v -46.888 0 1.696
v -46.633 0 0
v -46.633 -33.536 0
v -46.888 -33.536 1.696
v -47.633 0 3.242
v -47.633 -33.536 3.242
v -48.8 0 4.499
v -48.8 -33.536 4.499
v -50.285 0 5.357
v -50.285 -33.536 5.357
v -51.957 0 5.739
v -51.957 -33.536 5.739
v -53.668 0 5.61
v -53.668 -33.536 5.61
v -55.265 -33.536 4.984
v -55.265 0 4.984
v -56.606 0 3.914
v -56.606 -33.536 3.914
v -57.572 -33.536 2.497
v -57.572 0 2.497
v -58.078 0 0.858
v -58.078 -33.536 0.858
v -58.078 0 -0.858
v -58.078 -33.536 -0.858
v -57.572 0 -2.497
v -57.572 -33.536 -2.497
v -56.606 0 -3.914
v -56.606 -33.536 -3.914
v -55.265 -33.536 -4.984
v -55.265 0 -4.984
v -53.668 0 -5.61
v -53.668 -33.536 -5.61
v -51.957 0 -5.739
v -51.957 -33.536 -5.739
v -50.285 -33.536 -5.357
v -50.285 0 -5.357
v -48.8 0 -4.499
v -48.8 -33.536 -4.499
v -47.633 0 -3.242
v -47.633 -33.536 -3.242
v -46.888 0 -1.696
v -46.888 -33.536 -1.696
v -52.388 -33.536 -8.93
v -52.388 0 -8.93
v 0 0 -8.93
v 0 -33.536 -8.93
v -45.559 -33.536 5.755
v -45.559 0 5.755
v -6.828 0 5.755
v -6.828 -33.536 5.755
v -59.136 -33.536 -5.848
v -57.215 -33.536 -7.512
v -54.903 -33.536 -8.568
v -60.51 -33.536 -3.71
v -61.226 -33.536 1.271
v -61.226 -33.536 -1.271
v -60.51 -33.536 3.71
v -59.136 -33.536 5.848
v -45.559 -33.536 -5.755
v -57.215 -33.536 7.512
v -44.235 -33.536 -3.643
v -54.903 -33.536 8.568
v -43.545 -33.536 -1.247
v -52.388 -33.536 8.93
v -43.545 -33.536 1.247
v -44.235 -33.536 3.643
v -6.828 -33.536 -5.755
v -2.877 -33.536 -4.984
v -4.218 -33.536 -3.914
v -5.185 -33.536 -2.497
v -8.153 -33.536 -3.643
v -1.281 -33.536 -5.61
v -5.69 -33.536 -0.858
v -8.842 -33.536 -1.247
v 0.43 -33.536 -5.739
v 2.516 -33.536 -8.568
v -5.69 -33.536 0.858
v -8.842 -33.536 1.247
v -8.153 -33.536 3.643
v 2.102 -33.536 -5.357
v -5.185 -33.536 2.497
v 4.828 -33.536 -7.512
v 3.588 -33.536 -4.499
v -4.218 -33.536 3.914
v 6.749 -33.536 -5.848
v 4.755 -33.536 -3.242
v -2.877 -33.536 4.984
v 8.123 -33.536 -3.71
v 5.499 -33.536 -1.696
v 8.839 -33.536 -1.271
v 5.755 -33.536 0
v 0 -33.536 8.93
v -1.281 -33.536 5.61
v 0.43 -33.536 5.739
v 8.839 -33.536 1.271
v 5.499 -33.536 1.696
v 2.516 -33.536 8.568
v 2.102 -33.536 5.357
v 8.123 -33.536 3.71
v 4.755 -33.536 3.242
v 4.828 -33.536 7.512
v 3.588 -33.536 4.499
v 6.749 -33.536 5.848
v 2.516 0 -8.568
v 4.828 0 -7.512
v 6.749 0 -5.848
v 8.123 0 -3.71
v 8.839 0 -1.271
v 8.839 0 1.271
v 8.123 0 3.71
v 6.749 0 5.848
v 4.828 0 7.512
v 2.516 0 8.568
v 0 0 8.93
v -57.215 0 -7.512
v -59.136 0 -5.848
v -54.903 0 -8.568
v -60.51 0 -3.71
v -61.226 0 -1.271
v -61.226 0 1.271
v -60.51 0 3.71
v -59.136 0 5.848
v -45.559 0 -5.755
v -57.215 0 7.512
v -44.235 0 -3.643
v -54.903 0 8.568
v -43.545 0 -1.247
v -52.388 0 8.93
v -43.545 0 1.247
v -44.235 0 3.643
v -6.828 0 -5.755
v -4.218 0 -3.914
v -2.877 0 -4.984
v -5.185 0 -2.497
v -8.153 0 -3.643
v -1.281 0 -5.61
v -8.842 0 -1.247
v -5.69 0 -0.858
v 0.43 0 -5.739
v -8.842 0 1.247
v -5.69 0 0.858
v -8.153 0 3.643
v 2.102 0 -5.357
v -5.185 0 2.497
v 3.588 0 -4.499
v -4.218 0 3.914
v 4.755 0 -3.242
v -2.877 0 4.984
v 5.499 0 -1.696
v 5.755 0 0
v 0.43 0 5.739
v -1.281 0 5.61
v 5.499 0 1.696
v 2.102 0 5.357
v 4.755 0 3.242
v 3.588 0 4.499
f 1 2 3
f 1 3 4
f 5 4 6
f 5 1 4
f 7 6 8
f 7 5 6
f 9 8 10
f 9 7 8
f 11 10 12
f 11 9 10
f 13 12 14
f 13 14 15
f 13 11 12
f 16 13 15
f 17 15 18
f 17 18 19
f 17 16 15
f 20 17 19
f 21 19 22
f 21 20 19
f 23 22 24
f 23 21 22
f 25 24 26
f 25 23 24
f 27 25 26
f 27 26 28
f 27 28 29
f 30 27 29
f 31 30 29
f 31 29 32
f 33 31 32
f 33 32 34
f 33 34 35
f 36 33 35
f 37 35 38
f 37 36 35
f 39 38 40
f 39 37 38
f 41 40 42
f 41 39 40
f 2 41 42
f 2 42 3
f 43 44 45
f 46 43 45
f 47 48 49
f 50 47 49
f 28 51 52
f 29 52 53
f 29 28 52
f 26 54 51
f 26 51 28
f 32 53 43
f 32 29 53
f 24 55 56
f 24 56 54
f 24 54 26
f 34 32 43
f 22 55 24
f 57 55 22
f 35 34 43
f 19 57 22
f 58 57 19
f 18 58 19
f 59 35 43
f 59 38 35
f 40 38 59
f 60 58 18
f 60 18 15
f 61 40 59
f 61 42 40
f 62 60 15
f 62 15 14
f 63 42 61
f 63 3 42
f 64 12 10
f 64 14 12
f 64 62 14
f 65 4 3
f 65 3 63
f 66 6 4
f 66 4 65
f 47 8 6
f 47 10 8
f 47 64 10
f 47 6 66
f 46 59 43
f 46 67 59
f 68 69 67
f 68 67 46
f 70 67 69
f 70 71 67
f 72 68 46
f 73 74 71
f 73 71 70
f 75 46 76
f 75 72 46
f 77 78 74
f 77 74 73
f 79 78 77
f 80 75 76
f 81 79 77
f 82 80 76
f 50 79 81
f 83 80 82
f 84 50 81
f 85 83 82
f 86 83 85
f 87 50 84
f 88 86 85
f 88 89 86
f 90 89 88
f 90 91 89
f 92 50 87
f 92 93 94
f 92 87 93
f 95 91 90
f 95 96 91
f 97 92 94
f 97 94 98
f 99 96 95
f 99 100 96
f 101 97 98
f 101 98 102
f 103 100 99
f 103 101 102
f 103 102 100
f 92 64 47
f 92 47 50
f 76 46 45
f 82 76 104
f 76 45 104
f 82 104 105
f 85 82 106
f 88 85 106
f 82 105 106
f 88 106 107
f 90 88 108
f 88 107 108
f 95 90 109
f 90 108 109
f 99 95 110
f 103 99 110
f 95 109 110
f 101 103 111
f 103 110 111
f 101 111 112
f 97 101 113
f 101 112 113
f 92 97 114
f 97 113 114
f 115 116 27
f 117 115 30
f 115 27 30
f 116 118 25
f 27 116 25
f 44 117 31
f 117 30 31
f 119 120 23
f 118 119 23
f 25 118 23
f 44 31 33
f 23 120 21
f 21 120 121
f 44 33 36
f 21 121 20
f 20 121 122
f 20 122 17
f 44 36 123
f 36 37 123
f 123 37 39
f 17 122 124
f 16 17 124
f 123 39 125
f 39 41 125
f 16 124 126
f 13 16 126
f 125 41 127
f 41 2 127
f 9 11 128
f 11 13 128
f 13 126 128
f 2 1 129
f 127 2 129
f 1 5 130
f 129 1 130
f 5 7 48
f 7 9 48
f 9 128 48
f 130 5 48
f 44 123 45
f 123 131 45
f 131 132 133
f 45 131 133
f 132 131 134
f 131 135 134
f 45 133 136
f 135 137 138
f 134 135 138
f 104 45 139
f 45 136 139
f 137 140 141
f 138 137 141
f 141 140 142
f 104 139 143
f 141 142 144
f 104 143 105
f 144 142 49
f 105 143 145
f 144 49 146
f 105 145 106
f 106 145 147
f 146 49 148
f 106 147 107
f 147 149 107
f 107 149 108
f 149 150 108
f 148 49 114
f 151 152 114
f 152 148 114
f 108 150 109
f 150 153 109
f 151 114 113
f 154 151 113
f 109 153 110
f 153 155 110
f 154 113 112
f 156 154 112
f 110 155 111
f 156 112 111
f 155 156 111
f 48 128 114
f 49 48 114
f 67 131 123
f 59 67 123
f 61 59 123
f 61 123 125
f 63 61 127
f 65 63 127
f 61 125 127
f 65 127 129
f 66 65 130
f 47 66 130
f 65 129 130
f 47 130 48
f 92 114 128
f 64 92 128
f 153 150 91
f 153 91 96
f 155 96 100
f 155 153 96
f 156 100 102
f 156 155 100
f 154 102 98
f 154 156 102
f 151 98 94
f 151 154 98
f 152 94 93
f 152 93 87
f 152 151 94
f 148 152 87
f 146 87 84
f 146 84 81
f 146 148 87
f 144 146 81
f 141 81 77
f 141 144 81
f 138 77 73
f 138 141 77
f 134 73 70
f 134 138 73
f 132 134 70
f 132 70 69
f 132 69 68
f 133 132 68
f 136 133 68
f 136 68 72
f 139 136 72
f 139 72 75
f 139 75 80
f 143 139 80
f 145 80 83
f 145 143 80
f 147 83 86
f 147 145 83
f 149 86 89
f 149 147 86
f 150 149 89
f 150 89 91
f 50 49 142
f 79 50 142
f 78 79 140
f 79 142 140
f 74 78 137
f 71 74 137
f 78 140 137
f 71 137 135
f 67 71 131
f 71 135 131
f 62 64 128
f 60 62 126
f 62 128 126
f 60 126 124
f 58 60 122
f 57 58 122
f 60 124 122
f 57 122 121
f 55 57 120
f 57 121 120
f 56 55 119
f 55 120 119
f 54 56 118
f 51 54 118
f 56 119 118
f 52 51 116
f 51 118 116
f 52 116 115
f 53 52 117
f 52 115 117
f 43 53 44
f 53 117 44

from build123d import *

# Parameters (mm, degrees)
F0_R     = 5.7546875
F1_DEPTH = 33.5359375


with BuildPart() as f1:
    # F0 (on Front) → F1 (new body)
    with BuildSketch(Plane.XZ):
        with BuildLine():
            Line((0, 8.9296875), (-52.3875, 8.9296875))
            ThreePointArc((-52.3875, 8.9296875), (-61.3171875, 0), (-52.3875, -8.9296875))
            Line((-52.3875, -8.9296875), (0, -8.9296875))
            ThreePointArc((0, -8.9296875), (8.9296875, 0), (0, 8.9296875))
        make_face()
        with Locations((-52.3875, 0)):
            Circle(F0_R, mode=Mode.SUBTRACT)
        with BuildLine():
            Line((-45.5594043193, 5.7546875), (-6.8280956807, 5.7546875))
            ThreePointArc((-6.8280956807, 5.7546875), (-8.9296875, 0), (-6.8280956807, -5.7546875))
            Line((-6.8280956807, -5.7546875), (-45.5594043193, -5.7546875))
            ThreePointArc((-45.5594043193, -5.7546875), (-43.4578125, 0), (-45.5594043193, 5.7546875))
        make_face(mode=Mode.SUBTRACT)
        Circle(F0_R, mode=Mode.SUBTRACT)
    extrude(amount=F1_DEPTH)


solid = f1.part
